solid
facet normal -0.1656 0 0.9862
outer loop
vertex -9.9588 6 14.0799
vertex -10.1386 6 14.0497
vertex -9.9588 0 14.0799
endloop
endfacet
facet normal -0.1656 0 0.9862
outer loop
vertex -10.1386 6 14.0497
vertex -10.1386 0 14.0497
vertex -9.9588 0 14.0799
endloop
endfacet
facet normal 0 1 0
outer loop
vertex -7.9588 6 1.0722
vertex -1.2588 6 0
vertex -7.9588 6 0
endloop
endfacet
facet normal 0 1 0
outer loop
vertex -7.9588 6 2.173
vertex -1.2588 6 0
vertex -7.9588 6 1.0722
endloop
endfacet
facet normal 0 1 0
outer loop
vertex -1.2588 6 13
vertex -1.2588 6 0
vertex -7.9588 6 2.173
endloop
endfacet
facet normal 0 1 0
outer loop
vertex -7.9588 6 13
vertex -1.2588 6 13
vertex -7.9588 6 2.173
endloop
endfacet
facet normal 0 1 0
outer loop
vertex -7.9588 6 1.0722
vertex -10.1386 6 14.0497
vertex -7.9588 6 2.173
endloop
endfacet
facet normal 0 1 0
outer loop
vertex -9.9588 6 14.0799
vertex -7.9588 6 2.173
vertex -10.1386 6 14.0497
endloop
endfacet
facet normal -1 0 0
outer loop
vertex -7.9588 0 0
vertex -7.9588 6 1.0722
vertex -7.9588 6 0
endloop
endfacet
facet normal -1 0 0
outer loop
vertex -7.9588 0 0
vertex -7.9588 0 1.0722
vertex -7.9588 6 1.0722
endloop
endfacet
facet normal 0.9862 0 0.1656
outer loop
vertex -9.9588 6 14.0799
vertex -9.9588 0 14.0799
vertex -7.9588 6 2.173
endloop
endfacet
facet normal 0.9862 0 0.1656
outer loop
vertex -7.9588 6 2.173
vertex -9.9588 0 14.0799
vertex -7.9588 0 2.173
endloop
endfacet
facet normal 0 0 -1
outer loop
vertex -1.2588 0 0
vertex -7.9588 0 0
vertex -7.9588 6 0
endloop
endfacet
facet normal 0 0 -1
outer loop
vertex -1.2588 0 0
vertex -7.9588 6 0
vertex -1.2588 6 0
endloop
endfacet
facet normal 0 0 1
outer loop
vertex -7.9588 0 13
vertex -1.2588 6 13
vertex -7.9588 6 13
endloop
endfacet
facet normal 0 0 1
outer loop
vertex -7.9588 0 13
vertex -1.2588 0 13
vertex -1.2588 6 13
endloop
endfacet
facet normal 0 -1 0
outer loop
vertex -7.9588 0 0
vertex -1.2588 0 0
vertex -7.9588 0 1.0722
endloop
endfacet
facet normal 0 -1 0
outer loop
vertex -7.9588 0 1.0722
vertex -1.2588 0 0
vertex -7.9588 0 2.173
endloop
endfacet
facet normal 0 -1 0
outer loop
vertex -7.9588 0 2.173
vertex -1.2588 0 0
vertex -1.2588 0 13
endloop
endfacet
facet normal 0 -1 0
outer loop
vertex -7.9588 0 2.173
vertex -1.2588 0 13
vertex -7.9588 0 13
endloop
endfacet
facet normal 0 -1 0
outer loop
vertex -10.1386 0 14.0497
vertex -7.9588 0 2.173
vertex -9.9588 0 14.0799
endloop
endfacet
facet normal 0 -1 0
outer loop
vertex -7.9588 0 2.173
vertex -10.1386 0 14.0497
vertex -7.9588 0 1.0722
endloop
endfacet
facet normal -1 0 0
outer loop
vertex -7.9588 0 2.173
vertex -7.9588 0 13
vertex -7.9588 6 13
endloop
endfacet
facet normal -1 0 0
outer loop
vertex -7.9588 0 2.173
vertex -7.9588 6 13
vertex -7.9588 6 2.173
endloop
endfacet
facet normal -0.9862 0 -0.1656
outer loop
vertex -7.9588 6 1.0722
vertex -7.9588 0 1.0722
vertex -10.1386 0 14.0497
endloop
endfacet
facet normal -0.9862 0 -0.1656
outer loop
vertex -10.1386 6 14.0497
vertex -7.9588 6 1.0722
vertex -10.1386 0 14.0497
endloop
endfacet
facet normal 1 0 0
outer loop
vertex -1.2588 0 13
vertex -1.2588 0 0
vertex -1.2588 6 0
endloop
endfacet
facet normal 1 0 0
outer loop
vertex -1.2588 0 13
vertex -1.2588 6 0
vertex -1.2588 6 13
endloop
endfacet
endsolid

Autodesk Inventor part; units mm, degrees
ref_plane "YZ Plane" through (0, 0, 0) normal (1, 0, 0) x (0, 1, 0)
ref_plane "XZ Plane" through (0, 0, 0) normal (0, 1, 0) x (-1, 0, 0)
ref_plane "XY Plane" through (0, 0, 0) normal (0, 0, 1) x (1, 0, 0)
sketch "Sketch1" plane through (0, 0, 0) normal (0, 1, 0) x (-1, 0, 0)
  line L0 (1.2588, 13) -> (7.9588, 13)
  line L1 (7.9588, 13) -> (7.9588, 0)
  line L2 (7.9588, 0) -> (1.2588, 0)
  line L3 (1.2588, 0) -> (1.2588, 13)
  line L4 (7.9588, 1.0722) -> (10.1386, 14.0497)
  line L5 (10.1386, 14.0497) -> (9.9588, 14.0799)
  line L6 (9.9588, 14.0799) -> (7.9588, 2.173)
  point P0 (0, 0)
  dimension "d0" = 13
  dimension "d1" = 6.7
  dimension "d2" = 2
extrude "Extrusion1" add sketch "Sketch1" along normal blind 6 contours L0 L1 L2 L3
extrude "Extrusion2" add sketch "Sketch1" along normal blind 6 contours L6 L5 L4 L1
properties part number "koncnostikalo"
